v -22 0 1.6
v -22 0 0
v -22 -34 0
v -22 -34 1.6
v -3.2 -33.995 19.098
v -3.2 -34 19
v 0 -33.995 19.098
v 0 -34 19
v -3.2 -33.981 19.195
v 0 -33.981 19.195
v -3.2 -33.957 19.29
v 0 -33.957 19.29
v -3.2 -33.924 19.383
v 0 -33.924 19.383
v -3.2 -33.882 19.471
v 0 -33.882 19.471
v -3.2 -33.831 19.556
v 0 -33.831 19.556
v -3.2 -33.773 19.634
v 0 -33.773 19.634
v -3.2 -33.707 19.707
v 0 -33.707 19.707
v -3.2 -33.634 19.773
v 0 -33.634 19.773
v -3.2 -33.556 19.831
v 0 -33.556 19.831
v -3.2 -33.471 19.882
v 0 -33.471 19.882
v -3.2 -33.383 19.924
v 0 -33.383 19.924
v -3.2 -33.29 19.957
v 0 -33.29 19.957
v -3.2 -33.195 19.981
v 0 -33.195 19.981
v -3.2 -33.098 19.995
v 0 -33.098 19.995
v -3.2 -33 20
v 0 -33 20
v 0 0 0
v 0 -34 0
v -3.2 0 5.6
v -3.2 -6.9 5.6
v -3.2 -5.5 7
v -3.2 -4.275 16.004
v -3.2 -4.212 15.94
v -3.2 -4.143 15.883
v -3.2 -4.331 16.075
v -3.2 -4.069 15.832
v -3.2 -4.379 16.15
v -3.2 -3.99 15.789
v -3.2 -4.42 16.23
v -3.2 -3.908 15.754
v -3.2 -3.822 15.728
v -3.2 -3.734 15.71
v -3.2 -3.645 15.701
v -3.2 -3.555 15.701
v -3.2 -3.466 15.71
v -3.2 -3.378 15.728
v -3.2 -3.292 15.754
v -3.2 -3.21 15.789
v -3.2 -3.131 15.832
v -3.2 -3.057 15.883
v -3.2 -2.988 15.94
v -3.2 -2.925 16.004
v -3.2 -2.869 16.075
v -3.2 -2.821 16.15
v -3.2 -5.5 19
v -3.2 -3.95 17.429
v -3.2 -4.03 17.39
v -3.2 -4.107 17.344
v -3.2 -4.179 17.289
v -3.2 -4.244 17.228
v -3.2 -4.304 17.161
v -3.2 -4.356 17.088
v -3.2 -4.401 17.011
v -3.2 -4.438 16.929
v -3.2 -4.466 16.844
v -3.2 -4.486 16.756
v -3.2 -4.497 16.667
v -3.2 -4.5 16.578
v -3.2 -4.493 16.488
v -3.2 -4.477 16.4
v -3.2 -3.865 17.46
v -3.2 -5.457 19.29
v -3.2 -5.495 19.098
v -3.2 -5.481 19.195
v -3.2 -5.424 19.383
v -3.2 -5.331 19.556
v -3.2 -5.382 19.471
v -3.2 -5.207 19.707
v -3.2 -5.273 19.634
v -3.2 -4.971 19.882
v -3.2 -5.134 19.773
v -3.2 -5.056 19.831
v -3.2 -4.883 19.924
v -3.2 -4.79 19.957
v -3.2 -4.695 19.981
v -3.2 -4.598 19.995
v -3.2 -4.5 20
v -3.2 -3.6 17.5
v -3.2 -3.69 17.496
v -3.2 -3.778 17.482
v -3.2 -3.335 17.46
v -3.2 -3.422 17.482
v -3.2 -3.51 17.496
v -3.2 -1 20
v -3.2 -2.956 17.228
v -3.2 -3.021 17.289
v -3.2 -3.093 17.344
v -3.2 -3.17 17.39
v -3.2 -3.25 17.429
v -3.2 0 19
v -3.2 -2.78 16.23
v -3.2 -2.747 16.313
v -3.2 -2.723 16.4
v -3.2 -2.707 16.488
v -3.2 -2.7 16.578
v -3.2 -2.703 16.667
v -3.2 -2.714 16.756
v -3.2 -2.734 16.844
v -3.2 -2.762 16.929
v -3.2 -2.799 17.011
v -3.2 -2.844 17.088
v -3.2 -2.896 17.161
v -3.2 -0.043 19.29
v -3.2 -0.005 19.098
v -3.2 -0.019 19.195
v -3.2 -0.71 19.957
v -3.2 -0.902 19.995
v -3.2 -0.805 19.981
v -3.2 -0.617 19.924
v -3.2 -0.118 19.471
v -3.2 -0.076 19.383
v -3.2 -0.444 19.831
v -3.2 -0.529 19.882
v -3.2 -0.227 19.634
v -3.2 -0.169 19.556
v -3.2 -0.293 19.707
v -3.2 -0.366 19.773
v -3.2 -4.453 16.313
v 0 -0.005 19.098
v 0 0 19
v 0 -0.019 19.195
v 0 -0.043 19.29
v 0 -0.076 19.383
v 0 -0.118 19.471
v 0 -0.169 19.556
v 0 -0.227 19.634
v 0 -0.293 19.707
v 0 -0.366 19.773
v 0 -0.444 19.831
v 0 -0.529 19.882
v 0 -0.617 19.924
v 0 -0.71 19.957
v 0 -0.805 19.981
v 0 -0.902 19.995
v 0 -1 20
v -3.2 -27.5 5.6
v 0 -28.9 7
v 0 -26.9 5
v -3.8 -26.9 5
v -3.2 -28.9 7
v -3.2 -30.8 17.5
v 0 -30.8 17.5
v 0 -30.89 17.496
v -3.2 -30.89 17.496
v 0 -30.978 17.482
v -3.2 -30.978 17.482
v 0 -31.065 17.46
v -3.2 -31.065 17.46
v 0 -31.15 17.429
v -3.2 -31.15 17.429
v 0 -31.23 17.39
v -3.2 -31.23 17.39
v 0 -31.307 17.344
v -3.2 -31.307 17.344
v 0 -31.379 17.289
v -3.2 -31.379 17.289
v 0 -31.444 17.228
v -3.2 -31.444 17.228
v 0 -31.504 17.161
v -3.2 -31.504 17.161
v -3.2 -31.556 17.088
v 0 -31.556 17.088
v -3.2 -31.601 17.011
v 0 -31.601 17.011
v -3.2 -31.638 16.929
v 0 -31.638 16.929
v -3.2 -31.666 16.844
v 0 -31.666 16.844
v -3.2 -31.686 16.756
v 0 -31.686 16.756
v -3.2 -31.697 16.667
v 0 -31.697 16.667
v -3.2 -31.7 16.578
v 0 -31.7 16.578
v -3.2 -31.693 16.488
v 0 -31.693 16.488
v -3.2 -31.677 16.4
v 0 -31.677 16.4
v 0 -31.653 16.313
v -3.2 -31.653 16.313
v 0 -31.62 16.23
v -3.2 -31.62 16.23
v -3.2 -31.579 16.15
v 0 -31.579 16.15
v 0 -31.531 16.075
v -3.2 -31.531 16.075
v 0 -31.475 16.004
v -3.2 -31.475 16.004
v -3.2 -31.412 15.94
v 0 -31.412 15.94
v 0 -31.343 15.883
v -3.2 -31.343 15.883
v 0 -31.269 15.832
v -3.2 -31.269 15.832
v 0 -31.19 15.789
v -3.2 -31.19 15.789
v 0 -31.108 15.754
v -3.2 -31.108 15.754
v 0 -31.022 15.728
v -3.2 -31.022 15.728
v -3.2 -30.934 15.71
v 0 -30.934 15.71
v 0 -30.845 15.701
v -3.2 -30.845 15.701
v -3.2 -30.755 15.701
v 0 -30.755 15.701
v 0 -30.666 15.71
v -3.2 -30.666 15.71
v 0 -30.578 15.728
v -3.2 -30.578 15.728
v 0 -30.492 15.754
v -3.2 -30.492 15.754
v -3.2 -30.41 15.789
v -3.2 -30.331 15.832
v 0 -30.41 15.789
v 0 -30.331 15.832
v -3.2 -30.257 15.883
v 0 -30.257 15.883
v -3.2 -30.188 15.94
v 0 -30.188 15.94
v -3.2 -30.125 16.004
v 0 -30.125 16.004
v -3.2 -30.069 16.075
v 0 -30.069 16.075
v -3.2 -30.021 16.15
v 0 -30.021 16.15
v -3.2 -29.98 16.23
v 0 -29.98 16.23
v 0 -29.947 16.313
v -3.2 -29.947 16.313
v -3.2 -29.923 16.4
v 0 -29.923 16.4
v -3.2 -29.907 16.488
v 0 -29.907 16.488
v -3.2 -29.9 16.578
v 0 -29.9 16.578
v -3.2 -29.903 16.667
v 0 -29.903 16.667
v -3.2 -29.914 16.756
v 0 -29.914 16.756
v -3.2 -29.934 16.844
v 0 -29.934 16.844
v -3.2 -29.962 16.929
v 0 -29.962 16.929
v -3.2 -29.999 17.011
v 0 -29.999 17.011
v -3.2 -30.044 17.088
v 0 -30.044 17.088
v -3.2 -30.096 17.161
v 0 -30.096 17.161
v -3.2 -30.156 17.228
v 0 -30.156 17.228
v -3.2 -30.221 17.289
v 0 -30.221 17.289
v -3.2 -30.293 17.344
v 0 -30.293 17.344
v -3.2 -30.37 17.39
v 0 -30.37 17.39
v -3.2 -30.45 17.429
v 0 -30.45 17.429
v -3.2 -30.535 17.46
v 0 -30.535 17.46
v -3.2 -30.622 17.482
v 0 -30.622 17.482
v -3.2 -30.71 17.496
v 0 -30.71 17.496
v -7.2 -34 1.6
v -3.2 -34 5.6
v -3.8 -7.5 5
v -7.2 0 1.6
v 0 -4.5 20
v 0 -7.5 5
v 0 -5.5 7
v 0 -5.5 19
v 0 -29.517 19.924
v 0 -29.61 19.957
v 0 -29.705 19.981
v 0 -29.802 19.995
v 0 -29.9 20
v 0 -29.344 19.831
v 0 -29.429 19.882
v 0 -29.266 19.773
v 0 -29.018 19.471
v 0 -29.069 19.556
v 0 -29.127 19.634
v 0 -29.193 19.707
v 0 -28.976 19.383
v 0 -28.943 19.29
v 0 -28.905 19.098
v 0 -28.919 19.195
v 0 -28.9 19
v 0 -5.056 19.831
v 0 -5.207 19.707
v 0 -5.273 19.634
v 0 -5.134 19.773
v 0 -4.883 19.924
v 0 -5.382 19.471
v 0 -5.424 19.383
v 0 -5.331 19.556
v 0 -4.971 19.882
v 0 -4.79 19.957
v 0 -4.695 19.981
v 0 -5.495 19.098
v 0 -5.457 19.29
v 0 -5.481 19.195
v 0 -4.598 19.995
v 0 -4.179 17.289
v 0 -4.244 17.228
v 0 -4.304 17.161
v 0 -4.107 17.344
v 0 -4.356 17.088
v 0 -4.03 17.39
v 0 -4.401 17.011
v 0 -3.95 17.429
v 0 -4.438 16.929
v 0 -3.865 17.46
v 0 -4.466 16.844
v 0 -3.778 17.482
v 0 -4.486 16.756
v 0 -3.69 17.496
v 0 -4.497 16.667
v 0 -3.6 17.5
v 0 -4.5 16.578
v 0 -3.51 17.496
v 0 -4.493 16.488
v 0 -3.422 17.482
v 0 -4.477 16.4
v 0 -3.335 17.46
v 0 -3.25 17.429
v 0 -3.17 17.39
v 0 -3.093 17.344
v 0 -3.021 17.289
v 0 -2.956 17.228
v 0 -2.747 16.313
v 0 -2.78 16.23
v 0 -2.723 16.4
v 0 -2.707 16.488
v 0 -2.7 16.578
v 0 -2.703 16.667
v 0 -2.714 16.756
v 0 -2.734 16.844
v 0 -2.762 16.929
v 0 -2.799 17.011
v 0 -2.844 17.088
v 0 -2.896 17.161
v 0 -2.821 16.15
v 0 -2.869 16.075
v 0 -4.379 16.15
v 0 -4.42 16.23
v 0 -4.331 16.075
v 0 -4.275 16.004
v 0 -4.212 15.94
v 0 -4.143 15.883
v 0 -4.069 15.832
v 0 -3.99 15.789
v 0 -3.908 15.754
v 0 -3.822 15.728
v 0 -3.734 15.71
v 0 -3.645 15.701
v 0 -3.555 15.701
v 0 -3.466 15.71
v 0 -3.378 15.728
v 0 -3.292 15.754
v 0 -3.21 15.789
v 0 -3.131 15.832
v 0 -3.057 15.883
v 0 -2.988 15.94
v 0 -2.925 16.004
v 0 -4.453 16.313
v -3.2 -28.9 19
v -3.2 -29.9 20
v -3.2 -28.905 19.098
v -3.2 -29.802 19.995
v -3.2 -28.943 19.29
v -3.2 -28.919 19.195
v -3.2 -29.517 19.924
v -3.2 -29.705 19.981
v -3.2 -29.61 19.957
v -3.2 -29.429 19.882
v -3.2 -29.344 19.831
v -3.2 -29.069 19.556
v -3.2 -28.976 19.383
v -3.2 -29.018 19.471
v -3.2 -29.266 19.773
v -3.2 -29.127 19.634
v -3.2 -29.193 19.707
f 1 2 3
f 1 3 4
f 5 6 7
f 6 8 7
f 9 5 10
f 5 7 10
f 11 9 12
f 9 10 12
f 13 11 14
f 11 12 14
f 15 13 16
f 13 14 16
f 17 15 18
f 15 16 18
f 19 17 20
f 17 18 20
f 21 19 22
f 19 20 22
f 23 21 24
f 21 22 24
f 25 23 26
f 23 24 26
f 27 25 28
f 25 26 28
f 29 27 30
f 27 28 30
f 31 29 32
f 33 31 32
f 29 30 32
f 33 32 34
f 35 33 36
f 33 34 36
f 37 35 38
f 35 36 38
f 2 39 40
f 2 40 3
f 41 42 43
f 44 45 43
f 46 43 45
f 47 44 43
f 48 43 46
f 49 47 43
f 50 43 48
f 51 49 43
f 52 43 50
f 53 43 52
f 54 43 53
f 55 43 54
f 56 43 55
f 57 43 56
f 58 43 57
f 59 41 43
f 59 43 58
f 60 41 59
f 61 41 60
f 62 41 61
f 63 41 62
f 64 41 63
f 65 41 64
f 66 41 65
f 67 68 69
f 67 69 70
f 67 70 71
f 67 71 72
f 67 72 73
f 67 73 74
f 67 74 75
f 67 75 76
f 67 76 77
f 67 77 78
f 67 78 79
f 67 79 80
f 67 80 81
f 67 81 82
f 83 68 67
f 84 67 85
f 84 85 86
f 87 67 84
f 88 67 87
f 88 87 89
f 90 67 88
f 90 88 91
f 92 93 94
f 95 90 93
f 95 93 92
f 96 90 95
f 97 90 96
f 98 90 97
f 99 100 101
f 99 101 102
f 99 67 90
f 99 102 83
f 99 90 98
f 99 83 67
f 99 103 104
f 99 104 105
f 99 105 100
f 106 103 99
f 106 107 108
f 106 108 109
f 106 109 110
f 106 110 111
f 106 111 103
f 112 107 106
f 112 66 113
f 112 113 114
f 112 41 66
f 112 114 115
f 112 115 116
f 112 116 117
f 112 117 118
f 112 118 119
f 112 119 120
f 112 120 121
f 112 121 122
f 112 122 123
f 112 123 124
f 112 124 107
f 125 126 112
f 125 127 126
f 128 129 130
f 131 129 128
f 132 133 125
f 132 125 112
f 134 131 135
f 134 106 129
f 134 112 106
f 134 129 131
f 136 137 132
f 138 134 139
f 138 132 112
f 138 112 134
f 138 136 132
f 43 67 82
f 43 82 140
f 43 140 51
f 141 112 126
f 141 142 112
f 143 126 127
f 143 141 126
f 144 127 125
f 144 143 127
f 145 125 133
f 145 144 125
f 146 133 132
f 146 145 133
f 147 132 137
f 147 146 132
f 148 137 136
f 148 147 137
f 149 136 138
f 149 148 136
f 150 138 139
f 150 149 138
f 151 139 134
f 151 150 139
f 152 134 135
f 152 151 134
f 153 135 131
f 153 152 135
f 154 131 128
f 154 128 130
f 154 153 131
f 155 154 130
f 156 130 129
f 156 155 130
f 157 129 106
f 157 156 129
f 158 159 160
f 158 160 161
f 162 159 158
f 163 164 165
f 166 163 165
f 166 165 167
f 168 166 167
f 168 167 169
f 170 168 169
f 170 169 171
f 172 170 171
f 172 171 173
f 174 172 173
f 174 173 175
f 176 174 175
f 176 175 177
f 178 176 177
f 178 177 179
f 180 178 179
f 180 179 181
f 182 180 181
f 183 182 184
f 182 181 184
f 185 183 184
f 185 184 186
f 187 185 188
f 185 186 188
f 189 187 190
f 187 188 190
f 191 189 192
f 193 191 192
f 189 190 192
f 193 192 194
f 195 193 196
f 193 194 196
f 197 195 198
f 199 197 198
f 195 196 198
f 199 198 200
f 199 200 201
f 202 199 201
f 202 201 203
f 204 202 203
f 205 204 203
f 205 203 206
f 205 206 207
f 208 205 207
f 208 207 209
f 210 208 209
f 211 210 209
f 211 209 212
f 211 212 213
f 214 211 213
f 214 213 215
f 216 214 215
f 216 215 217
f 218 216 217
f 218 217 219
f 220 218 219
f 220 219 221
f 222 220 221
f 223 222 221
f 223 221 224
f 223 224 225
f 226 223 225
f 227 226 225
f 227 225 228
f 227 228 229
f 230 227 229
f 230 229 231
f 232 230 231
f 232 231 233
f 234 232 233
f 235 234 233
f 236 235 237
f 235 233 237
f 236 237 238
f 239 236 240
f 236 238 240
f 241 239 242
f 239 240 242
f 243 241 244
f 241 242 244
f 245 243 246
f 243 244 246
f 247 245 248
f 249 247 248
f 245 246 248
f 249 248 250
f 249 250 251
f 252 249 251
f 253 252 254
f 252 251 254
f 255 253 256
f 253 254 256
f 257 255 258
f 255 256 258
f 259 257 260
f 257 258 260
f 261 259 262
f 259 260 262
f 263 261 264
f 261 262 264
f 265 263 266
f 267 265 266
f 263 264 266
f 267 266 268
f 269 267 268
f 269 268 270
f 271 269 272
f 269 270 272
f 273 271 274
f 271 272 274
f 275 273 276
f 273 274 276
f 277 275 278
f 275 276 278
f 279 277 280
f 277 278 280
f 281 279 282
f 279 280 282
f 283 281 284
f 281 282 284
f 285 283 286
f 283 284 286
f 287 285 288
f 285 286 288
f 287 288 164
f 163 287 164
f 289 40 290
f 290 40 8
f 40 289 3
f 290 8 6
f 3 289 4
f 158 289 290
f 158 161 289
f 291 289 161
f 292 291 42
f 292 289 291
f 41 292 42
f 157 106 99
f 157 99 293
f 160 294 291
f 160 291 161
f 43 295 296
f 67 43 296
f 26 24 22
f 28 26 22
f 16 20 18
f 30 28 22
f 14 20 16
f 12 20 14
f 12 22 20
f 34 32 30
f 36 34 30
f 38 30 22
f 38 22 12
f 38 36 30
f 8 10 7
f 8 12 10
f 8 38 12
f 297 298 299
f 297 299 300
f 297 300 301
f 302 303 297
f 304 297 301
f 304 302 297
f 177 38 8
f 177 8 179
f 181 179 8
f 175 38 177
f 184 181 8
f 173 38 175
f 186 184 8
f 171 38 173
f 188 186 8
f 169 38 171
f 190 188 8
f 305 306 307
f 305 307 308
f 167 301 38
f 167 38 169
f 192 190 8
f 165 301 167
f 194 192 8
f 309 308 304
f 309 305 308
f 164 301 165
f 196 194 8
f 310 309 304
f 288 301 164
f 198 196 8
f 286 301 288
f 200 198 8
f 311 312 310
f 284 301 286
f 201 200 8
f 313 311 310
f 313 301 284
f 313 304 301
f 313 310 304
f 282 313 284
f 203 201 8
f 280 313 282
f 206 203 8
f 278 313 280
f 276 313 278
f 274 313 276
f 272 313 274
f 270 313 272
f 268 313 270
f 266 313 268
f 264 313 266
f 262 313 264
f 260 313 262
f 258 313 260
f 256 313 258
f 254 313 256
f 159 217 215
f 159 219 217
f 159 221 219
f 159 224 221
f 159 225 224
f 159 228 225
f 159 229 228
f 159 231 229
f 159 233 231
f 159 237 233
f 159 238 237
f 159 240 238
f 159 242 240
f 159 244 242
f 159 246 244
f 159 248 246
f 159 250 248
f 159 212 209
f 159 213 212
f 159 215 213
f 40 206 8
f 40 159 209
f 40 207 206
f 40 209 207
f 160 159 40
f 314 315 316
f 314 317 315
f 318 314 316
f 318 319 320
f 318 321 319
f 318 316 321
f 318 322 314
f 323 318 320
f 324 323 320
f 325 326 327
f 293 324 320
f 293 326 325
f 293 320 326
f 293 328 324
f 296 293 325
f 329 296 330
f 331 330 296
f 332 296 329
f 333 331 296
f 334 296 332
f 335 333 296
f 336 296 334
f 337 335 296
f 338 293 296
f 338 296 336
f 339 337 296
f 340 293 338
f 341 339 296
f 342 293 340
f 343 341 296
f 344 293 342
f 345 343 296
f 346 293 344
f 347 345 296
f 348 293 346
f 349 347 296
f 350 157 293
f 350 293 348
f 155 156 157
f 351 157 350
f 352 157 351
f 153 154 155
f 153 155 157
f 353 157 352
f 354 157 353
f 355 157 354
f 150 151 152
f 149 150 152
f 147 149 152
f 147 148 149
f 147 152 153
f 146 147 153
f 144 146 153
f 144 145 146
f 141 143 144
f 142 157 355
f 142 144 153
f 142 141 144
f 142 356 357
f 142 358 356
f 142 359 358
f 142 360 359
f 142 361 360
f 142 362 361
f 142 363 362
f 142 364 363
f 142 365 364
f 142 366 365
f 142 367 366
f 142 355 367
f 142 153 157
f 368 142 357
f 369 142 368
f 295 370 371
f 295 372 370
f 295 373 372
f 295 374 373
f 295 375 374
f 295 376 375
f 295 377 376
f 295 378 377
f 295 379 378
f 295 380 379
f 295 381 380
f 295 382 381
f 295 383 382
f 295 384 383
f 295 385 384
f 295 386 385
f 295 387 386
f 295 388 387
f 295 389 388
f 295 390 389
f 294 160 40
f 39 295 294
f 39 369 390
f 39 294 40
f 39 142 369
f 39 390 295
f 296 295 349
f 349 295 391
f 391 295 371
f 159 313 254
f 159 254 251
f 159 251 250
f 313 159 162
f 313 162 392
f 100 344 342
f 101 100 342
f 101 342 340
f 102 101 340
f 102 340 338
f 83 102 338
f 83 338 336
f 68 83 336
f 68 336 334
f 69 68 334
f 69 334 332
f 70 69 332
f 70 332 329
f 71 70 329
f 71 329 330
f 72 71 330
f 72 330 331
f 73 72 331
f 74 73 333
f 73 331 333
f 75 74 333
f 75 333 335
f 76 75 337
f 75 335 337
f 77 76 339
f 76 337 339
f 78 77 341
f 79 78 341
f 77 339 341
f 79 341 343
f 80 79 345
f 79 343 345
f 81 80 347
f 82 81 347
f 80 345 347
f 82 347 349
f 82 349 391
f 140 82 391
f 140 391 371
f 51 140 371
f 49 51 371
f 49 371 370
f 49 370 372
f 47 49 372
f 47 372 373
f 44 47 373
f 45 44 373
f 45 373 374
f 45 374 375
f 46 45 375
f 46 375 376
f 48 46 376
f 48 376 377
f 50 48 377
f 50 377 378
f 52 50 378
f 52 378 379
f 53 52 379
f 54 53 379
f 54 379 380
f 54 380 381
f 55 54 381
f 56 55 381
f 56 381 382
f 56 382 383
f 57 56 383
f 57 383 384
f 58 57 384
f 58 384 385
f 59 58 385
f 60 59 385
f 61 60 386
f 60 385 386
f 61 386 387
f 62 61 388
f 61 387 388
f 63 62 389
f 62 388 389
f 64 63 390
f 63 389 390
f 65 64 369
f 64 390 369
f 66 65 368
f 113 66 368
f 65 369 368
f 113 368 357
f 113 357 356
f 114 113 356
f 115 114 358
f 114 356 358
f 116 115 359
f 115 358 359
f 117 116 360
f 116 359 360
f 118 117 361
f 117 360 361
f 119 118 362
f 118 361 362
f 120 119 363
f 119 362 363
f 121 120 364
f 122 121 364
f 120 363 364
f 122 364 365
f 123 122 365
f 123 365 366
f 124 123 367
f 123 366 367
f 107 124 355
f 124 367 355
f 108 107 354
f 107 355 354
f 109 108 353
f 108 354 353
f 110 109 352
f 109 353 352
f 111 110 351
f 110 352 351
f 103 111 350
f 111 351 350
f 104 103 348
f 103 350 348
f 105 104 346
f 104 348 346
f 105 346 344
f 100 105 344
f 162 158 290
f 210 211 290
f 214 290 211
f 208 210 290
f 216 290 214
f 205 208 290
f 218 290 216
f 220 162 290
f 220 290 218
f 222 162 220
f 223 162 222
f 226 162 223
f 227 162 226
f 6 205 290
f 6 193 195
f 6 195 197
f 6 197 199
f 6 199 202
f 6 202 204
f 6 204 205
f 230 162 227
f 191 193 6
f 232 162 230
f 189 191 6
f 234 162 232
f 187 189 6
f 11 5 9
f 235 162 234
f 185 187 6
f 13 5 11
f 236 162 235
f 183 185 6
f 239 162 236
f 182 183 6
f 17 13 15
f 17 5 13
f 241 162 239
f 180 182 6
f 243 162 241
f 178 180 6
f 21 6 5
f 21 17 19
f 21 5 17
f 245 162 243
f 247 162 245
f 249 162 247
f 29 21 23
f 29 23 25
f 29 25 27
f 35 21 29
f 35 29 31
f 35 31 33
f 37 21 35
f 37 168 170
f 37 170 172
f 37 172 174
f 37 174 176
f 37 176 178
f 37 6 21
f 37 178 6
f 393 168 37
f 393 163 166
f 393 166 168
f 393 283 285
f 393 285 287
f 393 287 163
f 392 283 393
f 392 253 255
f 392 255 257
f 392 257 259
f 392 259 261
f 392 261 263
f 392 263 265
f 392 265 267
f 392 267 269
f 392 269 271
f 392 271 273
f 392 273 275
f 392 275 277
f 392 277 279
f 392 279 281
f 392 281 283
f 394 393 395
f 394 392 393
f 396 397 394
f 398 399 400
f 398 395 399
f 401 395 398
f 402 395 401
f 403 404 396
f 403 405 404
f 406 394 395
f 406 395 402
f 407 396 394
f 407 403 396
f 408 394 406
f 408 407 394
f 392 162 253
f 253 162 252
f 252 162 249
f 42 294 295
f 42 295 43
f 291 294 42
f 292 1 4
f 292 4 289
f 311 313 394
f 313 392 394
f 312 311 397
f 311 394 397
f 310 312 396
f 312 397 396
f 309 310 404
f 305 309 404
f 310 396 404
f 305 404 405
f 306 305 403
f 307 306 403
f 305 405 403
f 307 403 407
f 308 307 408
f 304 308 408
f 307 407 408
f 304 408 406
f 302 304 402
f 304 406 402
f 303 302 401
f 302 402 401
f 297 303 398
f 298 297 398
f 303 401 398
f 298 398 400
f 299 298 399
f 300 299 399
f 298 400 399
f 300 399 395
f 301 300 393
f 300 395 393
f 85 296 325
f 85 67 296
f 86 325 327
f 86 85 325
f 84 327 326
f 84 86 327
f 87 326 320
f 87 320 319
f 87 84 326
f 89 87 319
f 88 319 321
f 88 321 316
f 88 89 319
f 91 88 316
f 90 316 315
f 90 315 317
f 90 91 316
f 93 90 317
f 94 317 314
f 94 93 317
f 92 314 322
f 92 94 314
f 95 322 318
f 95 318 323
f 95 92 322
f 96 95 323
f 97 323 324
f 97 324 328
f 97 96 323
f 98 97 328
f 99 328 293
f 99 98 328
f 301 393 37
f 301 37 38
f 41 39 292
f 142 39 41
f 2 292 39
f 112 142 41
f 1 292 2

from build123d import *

# Parameters (mm, degrees)
PAD_DEPTH           = 34
PAD001_DEPTH        = 1.6
LINEARPATTERN_COUNT = 2
LINEARPATTERN_PITCH = 32.4
SKETCH_R            = 0.9
POCKET_DEPTH        = 22.001
SKETCH003_W         = 17
SKETCH003_H         = 23.4
POCKET001_DEPTH     = 22.001
FILLET_R            = 1
CHAMFER_SIZE        = 2


with BuildPart() as part:
    # Sketch001 → Pad (new body)
    with BuildSketch(Plane.XZ):
        Polygon((-22, 1.6), (-7.2, 1.6), (-3.2, 5.6), (-3.2, 20), (0, 20), (0, 0), (-22, 0), align=None)
    extrude(amount=PAD_DEPTH)

    # Sketch002 → Pad001 (join)
    with BuildSketch(Plane.XZ):
        Polygon((-6.6, 1.5), (-1.5, 6.6), (-1.5, 1.5), align=None)
    pad001 = extrude(amount=PAD001_DEPTH)

    # LinearPattern: Pad001 ×2
    with Locations(*[(0, -i * LINEARPATTERN_PITCH, 0) for i in range(1, LINEARPATTERN_COUNT)]):
        add(pad001)

    # Sketch (on DatumPlane) → Pocket (cut, through all)
    with BuildSketch(Plane(origin=(0, 0, 0), x_dir=(0, 0, 1), z_dir=(1, 0, 0))):
        with Locations((16.6, 30.8)):
            Circle(SKETCH_R)
        with Locations((16.6, 3.6)):
            Circle(SKETCH_R)
    extrude(amount=-POCKET_DEPTH, mode=Mode.SUBTRACT)

    # Sketch003 (on DatumPlane) → Pocket001 (cut, through all)
    with BuildSketch(Plane(origin=(0, 0, 0), x_dir=(0, 0, 1), z_dir=(1, 0, 0))):
        with Locations((13.5, 17.2)):
            Rectangle(SKETCH003_W, SKETCH003_H)
    extrude(amount=-POCKET001_DEPTH, mode=Mode.SUBTRACT)

    # Fillet
    fillet_edges = [part.edges().sort_by_distance(p)[0] for p in [
        (-1.6, -34, 20),
        (-1.6, -28.9, 20),
        (-1.6, -5.5, 20),
        (-1.6, 0, 20),
    ]]
    fillet(fillet_edges, radius=FILLET_R)

    # Chamfer
    chamfer_edges = [part.edges().sort_by_distance(p)[0] for p in [
        (-1.9, -28.9, 5),
        (-1.9, -5.5, 5),
    ]]
    chamfer(chamfer_edges, length=CHAMFER_SIZE)


solid = part.part
